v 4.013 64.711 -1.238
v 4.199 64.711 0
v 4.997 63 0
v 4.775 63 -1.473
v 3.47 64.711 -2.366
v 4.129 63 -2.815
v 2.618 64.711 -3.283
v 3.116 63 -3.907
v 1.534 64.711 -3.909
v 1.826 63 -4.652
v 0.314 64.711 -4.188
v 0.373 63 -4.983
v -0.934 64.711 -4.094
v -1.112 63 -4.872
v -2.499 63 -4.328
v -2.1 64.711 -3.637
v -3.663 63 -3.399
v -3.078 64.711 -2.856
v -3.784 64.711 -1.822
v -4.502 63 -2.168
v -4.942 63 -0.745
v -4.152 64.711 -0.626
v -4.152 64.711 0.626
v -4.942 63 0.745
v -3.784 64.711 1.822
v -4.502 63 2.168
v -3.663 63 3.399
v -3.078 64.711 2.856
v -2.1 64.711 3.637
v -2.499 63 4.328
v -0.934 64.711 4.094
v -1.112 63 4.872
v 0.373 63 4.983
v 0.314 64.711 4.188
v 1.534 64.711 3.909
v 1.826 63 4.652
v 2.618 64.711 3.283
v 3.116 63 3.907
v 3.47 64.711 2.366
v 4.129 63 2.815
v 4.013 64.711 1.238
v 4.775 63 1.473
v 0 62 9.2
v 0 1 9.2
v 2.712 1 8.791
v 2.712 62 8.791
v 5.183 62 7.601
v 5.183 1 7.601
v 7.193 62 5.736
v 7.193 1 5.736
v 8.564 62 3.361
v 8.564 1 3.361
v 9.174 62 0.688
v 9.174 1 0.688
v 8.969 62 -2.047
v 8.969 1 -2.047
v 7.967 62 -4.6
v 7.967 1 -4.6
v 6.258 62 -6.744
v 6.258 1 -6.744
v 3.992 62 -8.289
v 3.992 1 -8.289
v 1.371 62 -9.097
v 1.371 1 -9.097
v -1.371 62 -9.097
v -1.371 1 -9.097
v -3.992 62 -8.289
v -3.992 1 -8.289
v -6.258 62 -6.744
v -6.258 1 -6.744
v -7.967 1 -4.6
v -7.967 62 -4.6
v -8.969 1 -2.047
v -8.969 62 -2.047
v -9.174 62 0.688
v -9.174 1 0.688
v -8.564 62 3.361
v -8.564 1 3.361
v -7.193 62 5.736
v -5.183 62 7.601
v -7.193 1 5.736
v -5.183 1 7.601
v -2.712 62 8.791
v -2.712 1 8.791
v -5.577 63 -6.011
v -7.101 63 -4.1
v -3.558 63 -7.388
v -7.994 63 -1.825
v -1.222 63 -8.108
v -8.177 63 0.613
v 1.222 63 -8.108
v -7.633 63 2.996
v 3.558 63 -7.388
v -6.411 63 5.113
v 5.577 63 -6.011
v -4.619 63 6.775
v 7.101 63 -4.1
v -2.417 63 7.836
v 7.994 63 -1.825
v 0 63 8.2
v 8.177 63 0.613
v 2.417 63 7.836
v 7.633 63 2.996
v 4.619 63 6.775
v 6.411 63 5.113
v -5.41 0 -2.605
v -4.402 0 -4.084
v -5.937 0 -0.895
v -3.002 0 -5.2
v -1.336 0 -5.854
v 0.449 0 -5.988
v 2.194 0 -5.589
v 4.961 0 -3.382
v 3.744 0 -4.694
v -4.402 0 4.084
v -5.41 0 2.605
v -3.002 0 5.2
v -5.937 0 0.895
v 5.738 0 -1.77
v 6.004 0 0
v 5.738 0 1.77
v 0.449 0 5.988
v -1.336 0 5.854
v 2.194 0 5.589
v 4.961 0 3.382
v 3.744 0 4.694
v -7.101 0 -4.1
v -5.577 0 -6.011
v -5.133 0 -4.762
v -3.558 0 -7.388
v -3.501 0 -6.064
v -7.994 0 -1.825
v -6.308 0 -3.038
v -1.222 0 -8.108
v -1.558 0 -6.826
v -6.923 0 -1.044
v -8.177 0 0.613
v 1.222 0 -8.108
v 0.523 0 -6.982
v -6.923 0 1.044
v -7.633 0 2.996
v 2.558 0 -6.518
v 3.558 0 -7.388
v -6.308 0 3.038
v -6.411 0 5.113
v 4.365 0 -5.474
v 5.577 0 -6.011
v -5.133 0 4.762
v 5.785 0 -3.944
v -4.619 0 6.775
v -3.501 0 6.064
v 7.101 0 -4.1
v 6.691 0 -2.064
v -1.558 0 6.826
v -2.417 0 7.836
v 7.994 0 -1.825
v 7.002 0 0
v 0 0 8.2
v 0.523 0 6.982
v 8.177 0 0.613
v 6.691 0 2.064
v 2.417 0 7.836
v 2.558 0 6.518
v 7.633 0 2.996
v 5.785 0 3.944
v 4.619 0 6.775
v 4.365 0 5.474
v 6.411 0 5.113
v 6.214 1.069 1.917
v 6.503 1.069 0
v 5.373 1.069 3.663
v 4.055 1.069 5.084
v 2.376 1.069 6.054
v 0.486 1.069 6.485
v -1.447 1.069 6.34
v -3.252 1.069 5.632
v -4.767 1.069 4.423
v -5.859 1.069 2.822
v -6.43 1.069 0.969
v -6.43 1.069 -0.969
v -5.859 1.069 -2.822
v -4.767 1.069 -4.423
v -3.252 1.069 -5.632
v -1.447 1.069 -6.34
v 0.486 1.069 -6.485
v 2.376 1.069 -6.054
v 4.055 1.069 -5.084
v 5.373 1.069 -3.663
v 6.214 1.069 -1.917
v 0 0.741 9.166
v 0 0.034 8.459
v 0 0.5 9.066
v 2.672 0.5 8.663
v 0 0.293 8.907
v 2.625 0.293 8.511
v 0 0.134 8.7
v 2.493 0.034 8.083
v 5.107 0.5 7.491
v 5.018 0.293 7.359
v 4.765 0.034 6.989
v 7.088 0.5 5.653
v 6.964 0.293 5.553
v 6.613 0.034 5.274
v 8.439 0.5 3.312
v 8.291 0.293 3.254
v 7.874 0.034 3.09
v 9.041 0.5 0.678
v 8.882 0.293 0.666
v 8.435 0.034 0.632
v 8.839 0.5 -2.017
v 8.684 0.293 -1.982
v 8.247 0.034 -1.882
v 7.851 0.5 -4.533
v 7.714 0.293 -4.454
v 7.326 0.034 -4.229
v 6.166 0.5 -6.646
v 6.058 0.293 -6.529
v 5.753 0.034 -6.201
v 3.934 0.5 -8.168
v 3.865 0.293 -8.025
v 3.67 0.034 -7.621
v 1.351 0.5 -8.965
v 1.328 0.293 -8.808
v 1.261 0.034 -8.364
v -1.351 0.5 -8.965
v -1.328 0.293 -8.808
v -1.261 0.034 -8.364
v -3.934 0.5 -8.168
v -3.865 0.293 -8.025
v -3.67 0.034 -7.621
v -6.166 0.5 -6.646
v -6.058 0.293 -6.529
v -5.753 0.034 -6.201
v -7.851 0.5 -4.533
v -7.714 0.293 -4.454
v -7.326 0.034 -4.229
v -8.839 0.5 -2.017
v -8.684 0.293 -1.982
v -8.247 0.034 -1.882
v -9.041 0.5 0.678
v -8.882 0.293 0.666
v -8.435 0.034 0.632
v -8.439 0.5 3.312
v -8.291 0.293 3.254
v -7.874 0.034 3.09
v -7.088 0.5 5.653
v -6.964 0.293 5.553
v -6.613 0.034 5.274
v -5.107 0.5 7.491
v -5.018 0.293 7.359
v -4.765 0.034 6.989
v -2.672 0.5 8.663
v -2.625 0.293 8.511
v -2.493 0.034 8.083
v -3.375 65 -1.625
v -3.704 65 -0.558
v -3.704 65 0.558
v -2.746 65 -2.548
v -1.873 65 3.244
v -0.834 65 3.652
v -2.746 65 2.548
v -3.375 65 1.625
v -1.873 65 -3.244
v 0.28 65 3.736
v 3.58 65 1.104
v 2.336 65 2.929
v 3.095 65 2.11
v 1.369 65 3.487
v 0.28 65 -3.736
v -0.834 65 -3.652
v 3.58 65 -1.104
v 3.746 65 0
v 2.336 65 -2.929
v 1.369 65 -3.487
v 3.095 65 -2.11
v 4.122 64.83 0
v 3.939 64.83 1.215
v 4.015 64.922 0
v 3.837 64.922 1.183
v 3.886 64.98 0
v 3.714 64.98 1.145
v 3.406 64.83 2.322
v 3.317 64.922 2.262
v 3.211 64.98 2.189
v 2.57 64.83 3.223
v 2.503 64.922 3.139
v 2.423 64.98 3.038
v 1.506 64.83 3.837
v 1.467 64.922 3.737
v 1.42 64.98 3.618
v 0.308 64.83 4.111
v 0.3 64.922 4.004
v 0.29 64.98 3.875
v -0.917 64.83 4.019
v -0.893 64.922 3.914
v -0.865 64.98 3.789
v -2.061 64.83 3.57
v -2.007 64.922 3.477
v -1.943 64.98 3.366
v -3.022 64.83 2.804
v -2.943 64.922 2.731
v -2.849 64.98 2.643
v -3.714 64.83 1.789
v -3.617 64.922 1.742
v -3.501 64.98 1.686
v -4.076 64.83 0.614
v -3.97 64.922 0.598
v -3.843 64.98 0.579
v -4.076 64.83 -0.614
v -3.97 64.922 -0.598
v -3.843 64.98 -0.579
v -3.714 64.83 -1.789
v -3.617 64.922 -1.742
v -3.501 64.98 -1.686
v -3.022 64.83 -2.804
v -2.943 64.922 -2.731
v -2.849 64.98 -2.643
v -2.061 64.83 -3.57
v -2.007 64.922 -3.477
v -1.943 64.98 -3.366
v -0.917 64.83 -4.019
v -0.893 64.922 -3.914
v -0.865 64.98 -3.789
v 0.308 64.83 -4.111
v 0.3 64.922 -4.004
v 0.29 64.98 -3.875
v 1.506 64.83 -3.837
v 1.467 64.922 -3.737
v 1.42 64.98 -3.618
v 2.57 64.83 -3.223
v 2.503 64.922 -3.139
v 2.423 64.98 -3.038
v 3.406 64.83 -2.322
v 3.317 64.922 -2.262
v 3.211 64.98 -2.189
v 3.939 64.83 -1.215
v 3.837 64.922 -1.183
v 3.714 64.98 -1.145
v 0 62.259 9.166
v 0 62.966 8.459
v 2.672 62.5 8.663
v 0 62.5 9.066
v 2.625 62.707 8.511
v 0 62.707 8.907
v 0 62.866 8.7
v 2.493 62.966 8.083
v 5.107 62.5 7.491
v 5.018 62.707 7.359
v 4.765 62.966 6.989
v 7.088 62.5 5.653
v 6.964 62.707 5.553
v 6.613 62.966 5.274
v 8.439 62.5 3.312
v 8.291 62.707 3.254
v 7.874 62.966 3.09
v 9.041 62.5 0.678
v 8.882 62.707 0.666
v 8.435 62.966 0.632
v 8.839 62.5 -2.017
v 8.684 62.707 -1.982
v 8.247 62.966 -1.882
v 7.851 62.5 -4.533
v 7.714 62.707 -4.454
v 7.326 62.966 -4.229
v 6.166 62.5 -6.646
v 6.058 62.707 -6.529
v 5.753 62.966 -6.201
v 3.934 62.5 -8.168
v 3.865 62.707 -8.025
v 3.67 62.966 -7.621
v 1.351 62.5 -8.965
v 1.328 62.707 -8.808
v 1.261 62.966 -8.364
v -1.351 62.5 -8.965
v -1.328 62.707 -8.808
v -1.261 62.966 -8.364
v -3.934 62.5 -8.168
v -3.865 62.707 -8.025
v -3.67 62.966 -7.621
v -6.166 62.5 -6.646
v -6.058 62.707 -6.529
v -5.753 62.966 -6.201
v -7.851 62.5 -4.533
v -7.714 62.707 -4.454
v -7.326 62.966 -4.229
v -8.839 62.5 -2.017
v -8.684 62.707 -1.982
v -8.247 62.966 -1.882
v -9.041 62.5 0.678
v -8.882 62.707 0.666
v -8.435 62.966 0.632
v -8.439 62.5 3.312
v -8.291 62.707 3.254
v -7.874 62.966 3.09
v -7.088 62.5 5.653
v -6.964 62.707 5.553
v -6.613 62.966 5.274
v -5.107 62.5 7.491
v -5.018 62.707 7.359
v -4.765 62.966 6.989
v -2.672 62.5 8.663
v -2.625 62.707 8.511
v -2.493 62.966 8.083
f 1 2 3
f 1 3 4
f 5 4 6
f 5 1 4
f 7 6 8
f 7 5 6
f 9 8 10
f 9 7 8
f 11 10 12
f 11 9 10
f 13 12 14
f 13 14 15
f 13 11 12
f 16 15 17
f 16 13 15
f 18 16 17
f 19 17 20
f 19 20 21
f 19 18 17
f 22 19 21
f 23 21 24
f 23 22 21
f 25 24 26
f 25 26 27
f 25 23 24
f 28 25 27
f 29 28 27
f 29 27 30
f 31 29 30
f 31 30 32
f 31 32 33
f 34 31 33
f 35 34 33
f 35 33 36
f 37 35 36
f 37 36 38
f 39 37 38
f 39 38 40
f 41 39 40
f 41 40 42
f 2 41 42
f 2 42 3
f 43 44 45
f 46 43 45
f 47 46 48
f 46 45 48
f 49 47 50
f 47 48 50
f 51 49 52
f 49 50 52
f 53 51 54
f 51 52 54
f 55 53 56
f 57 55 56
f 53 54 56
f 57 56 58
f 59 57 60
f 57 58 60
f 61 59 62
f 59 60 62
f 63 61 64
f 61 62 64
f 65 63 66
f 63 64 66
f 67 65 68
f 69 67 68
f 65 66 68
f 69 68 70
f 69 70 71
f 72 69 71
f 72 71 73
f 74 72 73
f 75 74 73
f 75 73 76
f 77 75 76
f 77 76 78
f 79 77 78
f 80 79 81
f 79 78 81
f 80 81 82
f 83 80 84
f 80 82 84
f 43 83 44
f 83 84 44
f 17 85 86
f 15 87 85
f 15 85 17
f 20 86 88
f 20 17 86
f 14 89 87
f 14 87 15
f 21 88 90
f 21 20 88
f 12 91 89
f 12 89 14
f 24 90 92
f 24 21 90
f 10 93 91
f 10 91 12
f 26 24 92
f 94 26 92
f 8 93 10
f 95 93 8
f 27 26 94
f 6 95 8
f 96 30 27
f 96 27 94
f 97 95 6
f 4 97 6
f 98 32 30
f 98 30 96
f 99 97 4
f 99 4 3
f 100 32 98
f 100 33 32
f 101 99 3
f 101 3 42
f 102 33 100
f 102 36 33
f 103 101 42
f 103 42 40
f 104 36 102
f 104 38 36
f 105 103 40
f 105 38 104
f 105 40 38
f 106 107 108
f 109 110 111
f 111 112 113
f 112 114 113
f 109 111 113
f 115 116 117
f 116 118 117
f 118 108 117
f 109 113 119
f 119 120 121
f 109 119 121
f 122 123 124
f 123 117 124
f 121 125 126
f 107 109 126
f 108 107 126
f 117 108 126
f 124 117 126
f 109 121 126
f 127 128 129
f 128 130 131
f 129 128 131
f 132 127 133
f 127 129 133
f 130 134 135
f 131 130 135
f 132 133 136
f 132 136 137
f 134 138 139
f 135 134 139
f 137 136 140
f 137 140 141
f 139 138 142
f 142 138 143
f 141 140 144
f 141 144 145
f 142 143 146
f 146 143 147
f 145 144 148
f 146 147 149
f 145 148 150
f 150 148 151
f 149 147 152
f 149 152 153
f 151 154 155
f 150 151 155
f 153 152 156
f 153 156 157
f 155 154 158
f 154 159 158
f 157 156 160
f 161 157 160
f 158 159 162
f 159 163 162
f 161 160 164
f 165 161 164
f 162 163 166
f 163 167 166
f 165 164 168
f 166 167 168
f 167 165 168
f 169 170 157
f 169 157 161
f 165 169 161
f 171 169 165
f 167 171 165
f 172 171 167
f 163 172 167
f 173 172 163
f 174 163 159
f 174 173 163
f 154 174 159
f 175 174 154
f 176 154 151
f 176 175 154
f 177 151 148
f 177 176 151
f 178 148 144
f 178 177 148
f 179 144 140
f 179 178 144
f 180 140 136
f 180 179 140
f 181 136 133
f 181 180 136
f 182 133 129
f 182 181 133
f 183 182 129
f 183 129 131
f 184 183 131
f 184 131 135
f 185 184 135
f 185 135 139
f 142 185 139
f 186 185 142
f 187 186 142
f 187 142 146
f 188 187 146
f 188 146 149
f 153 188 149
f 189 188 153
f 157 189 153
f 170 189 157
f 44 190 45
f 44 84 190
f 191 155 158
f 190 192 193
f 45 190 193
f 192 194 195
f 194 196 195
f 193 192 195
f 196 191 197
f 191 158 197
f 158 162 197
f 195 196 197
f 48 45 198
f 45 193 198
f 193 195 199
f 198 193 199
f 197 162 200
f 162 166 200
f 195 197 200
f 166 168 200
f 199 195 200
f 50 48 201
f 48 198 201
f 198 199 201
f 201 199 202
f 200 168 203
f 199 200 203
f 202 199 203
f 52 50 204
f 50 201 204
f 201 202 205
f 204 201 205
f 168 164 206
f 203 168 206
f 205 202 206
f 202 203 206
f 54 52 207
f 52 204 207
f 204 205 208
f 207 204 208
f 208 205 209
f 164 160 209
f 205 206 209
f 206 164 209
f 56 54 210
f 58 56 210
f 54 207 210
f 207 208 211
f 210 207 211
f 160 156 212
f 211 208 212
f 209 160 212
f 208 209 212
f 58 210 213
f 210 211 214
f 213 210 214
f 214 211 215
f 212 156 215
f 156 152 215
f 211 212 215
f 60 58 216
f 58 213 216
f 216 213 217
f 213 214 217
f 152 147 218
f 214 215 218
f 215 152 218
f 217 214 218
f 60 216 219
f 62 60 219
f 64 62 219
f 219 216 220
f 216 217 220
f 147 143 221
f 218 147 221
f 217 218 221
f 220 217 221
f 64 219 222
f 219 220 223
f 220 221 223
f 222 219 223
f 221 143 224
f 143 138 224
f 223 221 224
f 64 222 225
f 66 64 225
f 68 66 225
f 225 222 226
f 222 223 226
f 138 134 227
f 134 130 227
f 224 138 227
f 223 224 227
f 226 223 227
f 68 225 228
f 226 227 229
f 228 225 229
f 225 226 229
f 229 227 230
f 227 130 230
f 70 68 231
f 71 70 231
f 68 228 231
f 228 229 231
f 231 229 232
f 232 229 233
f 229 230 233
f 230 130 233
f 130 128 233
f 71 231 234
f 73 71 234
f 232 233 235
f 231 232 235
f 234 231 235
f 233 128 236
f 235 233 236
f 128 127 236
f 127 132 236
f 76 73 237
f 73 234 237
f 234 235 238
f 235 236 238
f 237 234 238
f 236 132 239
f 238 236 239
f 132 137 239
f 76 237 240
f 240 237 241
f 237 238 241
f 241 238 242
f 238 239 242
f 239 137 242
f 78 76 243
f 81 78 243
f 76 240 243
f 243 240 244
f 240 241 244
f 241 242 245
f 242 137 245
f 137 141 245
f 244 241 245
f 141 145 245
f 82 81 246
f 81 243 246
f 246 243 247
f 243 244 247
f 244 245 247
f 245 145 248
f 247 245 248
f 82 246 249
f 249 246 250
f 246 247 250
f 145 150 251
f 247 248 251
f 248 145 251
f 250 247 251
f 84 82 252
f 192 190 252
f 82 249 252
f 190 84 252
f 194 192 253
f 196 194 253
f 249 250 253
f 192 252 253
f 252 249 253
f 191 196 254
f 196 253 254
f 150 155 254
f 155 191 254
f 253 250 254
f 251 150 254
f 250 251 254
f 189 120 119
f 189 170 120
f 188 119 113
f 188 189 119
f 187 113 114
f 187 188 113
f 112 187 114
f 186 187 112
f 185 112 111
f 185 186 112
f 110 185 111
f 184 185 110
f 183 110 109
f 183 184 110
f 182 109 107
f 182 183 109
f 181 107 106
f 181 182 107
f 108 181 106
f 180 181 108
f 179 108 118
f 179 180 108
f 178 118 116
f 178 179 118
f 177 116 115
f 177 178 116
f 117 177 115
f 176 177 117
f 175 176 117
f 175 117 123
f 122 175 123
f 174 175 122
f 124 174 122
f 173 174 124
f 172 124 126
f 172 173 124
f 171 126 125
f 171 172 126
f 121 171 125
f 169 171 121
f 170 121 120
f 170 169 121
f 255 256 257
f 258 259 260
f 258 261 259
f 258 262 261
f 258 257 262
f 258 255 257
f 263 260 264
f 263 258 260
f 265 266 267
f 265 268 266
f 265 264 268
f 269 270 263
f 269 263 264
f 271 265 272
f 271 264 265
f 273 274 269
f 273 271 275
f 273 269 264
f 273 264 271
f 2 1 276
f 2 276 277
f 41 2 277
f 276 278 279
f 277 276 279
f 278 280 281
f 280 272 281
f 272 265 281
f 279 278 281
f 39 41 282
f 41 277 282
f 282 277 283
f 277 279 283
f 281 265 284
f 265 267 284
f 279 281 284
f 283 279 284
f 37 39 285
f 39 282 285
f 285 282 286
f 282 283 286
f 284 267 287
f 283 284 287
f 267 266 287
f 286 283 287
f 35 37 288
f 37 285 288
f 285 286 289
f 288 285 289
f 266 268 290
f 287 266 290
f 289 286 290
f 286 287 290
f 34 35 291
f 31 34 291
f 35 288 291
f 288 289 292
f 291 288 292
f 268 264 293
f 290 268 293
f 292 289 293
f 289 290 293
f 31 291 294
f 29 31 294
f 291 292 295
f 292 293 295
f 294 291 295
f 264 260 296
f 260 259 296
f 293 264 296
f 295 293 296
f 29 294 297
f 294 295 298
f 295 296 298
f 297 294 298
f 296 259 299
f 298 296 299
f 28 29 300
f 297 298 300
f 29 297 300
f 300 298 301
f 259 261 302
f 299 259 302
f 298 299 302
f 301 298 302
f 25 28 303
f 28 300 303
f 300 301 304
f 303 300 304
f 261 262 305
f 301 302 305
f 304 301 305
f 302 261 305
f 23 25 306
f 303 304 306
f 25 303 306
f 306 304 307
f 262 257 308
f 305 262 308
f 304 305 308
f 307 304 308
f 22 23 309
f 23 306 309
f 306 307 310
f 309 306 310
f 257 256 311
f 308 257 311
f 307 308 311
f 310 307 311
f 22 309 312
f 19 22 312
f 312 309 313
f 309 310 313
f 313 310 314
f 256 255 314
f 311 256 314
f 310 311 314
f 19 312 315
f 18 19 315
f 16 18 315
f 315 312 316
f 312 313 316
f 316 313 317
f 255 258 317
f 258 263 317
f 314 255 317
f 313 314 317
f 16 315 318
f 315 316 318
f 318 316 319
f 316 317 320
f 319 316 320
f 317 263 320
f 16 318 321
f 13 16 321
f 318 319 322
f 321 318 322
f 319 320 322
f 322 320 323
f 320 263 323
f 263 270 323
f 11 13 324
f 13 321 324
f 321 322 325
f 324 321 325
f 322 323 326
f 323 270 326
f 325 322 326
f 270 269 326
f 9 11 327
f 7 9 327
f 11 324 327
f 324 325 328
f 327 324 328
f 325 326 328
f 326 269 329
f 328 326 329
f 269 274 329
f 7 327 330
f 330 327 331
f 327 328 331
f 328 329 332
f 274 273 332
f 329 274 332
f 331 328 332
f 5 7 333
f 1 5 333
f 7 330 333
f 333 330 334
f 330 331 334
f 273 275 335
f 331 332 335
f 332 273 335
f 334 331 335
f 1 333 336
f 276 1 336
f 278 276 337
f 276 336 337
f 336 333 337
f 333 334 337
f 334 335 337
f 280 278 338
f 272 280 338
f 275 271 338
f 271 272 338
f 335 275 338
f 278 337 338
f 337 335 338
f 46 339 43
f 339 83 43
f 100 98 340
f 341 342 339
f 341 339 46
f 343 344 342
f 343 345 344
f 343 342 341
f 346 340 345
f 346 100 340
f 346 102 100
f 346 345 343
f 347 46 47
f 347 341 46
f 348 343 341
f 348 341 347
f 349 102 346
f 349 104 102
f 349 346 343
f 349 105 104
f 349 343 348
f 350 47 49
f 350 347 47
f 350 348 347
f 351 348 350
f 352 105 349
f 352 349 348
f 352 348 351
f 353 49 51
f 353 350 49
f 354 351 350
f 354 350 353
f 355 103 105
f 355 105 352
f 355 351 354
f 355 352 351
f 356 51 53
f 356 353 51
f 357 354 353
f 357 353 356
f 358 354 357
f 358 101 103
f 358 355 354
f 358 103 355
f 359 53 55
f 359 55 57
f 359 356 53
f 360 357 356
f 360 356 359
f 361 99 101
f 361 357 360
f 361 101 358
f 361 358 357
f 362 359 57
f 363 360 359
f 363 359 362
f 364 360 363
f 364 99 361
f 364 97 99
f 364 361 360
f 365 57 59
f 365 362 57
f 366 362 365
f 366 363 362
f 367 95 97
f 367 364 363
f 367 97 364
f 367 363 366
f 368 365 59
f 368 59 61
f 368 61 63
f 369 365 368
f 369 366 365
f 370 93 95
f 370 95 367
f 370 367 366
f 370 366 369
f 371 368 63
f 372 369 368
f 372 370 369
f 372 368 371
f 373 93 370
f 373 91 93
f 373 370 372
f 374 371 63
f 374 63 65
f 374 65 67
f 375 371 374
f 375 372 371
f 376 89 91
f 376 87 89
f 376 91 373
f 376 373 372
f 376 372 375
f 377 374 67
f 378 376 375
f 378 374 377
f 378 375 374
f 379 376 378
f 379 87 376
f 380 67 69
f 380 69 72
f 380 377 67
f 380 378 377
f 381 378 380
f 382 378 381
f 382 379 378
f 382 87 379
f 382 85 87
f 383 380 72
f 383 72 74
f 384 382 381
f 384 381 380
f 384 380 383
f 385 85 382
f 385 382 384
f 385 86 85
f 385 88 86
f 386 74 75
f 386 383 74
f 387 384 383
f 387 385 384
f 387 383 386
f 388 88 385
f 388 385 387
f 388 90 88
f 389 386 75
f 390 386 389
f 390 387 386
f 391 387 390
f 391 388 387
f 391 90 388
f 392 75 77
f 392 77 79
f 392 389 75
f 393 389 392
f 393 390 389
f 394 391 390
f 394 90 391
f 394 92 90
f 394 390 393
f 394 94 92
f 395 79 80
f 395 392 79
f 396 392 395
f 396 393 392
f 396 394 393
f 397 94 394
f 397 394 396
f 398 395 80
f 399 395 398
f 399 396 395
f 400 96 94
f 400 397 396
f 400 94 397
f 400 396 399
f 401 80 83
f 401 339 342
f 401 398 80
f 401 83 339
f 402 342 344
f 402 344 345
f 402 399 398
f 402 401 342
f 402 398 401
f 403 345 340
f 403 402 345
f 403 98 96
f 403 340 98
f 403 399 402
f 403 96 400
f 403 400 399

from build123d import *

# Parameters (mm, degrees)
SKETCH1_R           = 9.2
BOSS_EXTRUDE1_DEPTH = 63
SKETCH2_R           = 4.997387286
BOSS_EXTRUDE2_DEPTH = 2
BOSS_EXTRUDE2_TAPER = 25
SKETCH3_R           = 7.00167494
SKETCH3_R_2         = 6.004433393
CUT_EXTRUDE1_DEPTH  = 3
CUT_EXTRUDE1_TAPER  = 25
FILLET1_R           = 1
FILLET2_R           = 0.5
FILLET3_R           = 1


with BuildPart() as part:
    # Sketch1 → Boss-Extrude1 (new body)
    with BuildSketch(Plane(origin=(0, 0, 0), x_dir=(1, 0, 0), z_dir=(0, 1, 0))):
        with Locations(Location((0, 0, 0), (0, 0, 270))):
            Circle(SKETCH1_R)
    extrude(amount=BOSS_EXTRUDE1_DEPTH)

    # Sketch2 → Boss-Extrude2 (add)
    with BuildSketch(Plane(origin=(0, 63, 0), x_dir=(1, 0, 0), z_dir=(0, 1, 0))):
        Circle(SKETCH2_R)
    extrude(amount=BOSS_EXTRUDE2_DEPTH, taper=BOSS_EXTRUDE2_TAPER)

    # Sketch3 → Cut-Extrude1 (cut)
    with BuildSketch(Plane.XZ):
        Circle(SKETCH3_R)
        Circle(SKETCH3_R_2, mode=Mode.SUBTRACT)
    extrude(amount=-CUT_EXTRUDE1_DEPTH, taper=CUT_EXTRUDE1_TAPER, mode=Mode.SUBTRACT)

    # Fillet1
    fillet1_edges = [part.edges().sort_by_distance(p)[0] for p in [
        (0, 63, -9.2),
    ]]
    fillet(fillet1_edges, radius=FILLET1_R)

    # Fillet2
    fillet2_edges = [part.edges().sort_by_distance(p)[0] for p in [
        (-4.064771969, 65, 0),
    ]]
    fillet(fillet2_edges, radius=FILLET2_R)

    # Fillet3
    fillet3_edges = [part.edges().sort_by_distance(p)[0] for p in [
        (0, 0, -9.2),
    ]]
    fillet(fillet3_edges, radius=FILLET3_R)


solid = part.part
